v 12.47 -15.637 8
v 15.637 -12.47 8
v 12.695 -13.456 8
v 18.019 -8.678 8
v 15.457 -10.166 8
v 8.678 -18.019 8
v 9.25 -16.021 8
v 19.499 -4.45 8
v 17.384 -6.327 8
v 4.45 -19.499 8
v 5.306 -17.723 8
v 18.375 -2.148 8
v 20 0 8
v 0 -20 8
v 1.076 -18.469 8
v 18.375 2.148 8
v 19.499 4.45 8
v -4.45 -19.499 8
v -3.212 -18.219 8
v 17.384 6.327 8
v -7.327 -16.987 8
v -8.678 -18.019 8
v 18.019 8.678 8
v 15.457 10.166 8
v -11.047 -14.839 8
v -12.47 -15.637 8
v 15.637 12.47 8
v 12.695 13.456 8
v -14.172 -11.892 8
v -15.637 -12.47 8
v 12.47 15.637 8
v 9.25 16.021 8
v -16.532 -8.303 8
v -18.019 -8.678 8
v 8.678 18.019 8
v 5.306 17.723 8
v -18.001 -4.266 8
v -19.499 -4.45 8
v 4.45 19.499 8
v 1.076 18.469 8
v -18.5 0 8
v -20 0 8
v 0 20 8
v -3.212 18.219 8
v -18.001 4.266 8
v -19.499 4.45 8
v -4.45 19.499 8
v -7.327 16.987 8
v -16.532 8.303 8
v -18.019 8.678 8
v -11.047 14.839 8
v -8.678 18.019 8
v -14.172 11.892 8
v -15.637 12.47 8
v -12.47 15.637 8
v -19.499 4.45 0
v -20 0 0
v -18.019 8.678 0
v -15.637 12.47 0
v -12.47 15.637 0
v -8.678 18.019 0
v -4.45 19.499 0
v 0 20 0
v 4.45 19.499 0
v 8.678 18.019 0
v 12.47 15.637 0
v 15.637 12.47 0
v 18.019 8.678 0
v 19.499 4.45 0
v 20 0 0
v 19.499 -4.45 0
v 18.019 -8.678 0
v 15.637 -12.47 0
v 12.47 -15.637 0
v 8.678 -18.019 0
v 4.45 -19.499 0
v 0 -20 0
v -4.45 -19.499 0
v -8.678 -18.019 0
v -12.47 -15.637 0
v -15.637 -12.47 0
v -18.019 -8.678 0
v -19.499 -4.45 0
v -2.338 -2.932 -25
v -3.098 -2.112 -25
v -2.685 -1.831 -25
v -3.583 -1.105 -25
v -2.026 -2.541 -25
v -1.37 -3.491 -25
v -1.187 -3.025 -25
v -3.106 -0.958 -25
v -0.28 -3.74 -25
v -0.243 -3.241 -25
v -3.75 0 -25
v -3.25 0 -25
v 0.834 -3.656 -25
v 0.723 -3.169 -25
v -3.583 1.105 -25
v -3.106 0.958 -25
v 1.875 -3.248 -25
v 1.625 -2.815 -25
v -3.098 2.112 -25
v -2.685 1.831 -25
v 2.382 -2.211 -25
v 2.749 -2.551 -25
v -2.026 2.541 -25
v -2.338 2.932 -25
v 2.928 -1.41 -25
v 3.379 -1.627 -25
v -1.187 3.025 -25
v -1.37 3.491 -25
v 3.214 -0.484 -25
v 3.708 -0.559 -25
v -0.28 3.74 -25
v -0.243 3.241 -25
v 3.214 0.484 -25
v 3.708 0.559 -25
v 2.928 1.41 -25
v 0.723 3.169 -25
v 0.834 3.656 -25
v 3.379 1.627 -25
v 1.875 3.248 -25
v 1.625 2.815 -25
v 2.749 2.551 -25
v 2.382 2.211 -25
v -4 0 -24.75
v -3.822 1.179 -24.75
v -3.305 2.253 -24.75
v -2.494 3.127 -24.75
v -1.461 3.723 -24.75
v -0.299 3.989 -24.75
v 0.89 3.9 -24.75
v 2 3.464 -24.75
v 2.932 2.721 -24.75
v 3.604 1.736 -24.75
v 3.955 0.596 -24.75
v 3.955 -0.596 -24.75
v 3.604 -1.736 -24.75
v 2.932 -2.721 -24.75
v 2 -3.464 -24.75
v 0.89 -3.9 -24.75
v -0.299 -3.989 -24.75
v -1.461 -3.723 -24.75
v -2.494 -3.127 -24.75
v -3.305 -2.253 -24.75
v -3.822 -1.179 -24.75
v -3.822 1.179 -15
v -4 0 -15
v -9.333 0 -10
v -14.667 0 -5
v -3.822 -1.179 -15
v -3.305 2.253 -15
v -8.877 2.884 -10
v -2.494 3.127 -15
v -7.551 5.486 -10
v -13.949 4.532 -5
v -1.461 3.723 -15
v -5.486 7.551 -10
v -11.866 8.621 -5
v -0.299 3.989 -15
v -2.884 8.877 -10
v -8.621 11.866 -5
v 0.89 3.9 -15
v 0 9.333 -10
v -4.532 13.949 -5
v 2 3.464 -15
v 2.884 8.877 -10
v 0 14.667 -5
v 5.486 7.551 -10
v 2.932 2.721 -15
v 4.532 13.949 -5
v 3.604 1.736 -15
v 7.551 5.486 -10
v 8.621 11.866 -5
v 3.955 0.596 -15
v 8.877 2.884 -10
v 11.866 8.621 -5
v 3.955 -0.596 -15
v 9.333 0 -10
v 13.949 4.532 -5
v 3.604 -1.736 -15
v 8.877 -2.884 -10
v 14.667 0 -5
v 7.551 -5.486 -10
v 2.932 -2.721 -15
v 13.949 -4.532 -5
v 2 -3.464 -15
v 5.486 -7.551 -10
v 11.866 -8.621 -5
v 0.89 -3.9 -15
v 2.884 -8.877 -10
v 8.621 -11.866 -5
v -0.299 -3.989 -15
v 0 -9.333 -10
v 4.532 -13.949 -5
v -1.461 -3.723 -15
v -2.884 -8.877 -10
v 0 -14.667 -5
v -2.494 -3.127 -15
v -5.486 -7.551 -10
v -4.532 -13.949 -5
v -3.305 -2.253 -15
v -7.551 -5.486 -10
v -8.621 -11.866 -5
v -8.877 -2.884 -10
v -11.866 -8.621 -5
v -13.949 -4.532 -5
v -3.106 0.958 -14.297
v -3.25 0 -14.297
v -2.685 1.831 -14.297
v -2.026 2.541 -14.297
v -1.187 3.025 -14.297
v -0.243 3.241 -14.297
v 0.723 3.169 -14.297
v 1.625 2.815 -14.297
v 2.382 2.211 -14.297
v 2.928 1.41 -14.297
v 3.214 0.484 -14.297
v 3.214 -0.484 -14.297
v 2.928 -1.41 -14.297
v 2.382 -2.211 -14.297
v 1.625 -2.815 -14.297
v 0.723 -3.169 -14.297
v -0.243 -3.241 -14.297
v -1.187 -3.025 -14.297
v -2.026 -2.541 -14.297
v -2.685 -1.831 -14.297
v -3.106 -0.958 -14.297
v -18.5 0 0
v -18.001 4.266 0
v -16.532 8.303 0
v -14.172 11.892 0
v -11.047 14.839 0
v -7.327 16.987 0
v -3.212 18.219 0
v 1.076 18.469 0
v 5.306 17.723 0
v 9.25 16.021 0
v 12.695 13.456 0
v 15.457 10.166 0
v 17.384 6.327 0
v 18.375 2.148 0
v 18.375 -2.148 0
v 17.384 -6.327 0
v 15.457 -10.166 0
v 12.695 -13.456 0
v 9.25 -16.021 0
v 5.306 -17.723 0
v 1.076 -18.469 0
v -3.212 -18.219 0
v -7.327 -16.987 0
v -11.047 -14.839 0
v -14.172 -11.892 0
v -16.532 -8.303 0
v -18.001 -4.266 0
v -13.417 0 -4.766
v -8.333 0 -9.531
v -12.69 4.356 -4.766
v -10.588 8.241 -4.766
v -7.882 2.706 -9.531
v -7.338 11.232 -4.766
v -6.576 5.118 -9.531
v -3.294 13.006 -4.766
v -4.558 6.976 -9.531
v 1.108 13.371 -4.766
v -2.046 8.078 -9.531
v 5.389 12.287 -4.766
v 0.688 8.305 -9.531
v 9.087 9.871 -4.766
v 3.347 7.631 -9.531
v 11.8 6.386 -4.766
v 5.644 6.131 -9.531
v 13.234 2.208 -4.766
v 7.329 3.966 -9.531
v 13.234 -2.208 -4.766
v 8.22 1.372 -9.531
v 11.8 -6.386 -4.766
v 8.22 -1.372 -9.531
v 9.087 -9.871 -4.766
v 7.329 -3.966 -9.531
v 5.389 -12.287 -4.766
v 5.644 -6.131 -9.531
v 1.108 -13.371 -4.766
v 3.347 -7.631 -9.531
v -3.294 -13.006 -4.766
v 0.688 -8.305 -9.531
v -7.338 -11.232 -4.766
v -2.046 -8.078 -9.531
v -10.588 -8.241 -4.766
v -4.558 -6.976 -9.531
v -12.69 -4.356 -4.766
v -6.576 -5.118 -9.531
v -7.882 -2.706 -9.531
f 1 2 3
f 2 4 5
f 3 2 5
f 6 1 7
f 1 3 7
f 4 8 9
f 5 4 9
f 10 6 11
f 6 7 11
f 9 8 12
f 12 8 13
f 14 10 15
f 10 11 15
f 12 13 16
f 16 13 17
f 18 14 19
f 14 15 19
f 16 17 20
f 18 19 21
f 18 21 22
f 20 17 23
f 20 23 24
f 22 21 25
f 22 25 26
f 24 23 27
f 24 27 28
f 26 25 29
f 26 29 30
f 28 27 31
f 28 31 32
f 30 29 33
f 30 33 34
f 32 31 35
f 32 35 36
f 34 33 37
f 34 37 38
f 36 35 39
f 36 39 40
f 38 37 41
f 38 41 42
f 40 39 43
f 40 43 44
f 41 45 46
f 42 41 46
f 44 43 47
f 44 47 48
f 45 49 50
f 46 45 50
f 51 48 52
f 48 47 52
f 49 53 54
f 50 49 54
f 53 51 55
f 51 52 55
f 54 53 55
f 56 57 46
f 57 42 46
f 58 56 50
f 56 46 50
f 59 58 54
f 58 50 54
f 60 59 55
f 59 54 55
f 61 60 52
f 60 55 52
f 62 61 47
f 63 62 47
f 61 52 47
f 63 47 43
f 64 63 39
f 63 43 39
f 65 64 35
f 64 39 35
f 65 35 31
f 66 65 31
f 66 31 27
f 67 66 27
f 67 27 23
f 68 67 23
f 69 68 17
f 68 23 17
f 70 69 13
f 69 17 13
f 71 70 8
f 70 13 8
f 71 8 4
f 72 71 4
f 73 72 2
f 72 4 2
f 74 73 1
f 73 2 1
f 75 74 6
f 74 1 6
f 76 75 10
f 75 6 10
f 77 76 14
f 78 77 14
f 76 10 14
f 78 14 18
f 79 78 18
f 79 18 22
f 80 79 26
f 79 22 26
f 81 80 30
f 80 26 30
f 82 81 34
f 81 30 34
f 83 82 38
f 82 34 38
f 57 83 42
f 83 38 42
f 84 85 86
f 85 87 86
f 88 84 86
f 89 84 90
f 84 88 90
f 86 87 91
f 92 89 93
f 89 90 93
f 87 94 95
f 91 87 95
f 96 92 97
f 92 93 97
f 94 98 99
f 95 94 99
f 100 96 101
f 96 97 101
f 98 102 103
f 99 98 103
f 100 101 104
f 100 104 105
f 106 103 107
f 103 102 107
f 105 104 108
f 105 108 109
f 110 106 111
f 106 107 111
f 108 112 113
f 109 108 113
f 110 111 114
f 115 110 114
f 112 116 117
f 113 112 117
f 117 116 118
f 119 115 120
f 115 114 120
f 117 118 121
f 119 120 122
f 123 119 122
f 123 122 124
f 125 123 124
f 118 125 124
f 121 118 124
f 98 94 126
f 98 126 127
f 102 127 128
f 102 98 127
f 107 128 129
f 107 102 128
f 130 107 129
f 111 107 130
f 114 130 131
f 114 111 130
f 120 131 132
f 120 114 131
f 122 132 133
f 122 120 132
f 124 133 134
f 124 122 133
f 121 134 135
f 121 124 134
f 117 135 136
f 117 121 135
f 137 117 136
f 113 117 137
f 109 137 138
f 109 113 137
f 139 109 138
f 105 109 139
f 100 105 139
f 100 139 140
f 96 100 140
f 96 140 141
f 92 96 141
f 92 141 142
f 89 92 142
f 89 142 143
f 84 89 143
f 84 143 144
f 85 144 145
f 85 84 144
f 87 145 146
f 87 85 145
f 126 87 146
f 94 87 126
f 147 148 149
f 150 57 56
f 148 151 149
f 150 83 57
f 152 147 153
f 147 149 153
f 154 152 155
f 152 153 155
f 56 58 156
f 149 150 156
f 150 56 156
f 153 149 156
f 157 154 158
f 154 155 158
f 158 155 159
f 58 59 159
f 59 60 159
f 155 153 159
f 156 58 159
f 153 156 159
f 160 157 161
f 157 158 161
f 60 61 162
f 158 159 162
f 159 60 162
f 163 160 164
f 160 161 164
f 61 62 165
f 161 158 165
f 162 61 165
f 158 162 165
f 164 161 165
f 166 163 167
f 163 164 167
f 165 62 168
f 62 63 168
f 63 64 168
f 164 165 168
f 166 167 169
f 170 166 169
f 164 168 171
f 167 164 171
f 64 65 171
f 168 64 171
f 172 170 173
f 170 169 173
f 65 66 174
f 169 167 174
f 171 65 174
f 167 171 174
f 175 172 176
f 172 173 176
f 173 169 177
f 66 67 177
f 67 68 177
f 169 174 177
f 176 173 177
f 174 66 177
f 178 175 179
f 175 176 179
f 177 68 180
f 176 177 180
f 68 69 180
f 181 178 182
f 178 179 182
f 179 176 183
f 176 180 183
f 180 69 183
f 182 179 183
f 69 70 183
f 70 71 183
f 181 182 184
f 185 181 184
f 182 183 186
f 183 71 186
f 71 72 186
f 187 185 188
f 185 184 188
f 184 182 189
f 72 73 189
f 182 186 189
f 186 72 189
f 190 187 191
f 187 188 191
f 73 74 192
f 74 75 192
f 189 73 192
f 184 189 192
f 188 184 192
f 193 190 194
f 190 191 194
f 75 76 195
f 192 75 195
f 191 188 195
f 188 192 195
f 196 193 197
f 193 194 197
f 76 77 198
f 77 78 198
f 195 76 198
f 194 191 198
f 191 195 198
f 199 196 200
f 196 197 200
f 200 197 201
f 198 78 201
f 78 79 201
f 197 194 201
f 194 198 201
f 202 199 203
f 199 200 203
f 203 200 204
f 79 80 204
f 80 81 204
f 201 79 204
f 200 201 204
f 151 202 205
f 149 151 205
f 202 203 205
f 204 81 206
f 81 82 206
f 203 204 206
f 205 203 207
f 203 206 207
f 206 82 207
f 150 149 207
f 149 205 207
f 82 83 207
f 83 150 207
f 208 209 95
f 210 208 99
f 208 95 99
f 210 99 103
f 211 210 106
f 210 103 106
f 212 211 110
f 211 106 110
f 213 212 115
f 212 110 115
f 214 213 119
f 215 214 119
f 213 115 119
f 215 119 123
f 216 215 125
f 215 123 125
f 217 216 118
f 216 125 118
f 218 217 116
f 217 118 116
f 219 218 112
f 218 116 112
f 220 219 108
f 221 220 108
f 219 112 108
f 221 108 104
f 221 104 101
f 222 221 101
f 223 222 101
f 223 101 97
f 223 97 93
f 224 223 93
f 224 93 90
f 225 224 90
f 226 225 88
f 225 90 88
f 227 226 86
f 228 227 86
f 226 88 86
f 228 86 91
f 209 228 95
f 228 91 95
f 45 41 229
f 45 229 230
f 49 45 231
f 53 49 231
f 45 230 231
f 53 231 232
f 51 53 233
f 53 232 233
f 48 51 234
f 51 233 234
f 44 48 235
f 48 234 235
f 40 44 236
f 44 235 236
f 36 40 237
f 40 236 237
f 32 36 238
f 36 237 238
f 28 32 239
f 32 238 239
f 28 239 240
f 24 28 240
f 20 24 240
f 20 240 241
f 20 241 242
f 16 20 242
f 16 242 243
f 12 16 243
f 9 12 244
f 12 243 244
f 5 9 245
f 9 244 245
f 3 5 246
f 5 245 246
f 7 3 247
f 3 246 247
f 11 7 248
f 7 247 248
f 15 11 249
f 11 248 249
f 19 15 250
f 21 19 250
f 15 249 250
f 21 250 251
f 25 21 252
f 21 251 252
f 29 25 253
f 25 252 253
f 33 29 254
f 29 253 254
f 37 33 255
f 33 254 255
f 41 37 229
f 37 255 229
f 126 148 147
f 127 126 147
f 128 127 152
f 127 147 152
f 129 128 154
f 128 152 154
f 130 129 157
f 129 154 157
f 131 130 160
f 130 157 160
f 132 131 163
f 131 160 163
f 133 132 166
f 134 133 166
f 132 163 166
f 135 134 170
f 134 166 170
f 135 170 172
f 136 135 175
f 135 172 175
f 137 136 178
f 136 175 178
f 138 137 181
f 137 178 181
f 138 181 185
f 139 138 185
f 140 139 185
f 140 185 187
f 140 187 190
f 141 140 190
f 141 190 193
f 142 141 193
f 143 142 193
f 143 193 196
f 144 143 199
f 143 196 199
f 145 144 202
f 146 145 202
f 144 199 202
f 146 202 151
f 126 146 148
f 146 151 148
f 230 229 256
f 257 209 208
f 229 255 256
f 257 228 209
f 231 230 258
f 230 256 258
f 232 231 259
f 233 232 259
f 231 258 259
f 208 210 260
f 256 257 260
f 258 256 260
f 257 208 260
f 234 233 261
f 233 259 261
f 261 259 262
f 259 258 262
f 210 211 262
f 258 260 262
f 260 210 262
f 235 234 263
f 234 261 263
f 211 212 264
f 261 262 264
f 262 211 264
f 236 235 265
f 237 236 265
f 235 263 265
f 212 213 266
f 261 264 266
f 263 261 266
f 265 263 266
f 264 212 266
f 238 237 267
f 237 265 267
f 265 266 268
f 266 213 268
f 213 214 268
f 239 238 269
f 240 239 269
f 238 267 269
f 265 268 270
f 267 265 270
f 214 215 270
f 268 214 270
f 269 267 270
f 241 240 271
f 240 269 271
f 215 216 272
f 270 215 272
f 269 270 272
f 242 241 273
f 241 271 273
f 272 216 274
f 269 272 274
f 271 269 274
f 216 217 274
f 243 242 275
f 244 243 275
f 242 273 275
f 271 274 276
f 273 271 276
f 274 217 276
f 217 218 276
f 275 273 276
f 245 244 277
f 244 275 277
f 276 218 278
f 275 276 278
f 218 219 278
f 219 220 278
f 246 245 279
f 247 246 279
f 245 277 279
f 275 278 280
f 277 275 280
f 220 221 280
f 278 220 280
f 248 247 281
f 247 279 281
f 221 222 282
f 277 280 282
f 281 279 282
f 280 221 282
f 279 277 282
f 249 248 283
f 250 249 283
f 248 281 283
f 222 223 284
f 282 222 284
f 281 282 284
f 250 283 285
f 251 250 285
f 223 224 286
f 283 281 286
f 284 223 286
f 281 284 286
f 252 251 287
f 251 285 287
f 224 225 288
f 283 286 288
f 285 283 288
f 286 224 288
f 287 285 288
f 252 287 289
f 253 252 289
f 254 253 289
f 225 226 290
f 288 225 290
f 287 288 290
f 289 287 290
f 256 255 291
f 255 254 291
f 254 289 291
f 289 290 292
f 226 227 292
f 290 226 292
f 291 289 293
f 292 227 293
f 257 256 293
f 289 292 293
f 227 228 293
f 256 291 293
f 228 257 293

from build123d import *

# Parameters (mm, degrees)
CHAMFER2_SIZE = 0.25


with BuildPart() as part:
    # Sketch1 → Revolve1 (revolve)
    with BuildSketch(Plane(origin=(0, 0, 0), x_dir=(1, 0, 0), z_dir=(0, 1, 0))):
        Polygon((-4, 25), (-4, 15), (-20, 0), (-20, -8), (-18.5, -8), (-18.5, 0), (-3.25, 14.296875), (-3.25, 25), align=None)
    revolve(axis=Axis((0, 0, 0), (0, 0, -1)))

    # Chamfer2
    chamfer2_edges = [part.edges().sort_by_distance(p)[0] for p in [
        (4, 0, -25),
    ]]
    chamfer(chamfer2_edges, length=CHAMFER2_SIZE)


solid = part.part
